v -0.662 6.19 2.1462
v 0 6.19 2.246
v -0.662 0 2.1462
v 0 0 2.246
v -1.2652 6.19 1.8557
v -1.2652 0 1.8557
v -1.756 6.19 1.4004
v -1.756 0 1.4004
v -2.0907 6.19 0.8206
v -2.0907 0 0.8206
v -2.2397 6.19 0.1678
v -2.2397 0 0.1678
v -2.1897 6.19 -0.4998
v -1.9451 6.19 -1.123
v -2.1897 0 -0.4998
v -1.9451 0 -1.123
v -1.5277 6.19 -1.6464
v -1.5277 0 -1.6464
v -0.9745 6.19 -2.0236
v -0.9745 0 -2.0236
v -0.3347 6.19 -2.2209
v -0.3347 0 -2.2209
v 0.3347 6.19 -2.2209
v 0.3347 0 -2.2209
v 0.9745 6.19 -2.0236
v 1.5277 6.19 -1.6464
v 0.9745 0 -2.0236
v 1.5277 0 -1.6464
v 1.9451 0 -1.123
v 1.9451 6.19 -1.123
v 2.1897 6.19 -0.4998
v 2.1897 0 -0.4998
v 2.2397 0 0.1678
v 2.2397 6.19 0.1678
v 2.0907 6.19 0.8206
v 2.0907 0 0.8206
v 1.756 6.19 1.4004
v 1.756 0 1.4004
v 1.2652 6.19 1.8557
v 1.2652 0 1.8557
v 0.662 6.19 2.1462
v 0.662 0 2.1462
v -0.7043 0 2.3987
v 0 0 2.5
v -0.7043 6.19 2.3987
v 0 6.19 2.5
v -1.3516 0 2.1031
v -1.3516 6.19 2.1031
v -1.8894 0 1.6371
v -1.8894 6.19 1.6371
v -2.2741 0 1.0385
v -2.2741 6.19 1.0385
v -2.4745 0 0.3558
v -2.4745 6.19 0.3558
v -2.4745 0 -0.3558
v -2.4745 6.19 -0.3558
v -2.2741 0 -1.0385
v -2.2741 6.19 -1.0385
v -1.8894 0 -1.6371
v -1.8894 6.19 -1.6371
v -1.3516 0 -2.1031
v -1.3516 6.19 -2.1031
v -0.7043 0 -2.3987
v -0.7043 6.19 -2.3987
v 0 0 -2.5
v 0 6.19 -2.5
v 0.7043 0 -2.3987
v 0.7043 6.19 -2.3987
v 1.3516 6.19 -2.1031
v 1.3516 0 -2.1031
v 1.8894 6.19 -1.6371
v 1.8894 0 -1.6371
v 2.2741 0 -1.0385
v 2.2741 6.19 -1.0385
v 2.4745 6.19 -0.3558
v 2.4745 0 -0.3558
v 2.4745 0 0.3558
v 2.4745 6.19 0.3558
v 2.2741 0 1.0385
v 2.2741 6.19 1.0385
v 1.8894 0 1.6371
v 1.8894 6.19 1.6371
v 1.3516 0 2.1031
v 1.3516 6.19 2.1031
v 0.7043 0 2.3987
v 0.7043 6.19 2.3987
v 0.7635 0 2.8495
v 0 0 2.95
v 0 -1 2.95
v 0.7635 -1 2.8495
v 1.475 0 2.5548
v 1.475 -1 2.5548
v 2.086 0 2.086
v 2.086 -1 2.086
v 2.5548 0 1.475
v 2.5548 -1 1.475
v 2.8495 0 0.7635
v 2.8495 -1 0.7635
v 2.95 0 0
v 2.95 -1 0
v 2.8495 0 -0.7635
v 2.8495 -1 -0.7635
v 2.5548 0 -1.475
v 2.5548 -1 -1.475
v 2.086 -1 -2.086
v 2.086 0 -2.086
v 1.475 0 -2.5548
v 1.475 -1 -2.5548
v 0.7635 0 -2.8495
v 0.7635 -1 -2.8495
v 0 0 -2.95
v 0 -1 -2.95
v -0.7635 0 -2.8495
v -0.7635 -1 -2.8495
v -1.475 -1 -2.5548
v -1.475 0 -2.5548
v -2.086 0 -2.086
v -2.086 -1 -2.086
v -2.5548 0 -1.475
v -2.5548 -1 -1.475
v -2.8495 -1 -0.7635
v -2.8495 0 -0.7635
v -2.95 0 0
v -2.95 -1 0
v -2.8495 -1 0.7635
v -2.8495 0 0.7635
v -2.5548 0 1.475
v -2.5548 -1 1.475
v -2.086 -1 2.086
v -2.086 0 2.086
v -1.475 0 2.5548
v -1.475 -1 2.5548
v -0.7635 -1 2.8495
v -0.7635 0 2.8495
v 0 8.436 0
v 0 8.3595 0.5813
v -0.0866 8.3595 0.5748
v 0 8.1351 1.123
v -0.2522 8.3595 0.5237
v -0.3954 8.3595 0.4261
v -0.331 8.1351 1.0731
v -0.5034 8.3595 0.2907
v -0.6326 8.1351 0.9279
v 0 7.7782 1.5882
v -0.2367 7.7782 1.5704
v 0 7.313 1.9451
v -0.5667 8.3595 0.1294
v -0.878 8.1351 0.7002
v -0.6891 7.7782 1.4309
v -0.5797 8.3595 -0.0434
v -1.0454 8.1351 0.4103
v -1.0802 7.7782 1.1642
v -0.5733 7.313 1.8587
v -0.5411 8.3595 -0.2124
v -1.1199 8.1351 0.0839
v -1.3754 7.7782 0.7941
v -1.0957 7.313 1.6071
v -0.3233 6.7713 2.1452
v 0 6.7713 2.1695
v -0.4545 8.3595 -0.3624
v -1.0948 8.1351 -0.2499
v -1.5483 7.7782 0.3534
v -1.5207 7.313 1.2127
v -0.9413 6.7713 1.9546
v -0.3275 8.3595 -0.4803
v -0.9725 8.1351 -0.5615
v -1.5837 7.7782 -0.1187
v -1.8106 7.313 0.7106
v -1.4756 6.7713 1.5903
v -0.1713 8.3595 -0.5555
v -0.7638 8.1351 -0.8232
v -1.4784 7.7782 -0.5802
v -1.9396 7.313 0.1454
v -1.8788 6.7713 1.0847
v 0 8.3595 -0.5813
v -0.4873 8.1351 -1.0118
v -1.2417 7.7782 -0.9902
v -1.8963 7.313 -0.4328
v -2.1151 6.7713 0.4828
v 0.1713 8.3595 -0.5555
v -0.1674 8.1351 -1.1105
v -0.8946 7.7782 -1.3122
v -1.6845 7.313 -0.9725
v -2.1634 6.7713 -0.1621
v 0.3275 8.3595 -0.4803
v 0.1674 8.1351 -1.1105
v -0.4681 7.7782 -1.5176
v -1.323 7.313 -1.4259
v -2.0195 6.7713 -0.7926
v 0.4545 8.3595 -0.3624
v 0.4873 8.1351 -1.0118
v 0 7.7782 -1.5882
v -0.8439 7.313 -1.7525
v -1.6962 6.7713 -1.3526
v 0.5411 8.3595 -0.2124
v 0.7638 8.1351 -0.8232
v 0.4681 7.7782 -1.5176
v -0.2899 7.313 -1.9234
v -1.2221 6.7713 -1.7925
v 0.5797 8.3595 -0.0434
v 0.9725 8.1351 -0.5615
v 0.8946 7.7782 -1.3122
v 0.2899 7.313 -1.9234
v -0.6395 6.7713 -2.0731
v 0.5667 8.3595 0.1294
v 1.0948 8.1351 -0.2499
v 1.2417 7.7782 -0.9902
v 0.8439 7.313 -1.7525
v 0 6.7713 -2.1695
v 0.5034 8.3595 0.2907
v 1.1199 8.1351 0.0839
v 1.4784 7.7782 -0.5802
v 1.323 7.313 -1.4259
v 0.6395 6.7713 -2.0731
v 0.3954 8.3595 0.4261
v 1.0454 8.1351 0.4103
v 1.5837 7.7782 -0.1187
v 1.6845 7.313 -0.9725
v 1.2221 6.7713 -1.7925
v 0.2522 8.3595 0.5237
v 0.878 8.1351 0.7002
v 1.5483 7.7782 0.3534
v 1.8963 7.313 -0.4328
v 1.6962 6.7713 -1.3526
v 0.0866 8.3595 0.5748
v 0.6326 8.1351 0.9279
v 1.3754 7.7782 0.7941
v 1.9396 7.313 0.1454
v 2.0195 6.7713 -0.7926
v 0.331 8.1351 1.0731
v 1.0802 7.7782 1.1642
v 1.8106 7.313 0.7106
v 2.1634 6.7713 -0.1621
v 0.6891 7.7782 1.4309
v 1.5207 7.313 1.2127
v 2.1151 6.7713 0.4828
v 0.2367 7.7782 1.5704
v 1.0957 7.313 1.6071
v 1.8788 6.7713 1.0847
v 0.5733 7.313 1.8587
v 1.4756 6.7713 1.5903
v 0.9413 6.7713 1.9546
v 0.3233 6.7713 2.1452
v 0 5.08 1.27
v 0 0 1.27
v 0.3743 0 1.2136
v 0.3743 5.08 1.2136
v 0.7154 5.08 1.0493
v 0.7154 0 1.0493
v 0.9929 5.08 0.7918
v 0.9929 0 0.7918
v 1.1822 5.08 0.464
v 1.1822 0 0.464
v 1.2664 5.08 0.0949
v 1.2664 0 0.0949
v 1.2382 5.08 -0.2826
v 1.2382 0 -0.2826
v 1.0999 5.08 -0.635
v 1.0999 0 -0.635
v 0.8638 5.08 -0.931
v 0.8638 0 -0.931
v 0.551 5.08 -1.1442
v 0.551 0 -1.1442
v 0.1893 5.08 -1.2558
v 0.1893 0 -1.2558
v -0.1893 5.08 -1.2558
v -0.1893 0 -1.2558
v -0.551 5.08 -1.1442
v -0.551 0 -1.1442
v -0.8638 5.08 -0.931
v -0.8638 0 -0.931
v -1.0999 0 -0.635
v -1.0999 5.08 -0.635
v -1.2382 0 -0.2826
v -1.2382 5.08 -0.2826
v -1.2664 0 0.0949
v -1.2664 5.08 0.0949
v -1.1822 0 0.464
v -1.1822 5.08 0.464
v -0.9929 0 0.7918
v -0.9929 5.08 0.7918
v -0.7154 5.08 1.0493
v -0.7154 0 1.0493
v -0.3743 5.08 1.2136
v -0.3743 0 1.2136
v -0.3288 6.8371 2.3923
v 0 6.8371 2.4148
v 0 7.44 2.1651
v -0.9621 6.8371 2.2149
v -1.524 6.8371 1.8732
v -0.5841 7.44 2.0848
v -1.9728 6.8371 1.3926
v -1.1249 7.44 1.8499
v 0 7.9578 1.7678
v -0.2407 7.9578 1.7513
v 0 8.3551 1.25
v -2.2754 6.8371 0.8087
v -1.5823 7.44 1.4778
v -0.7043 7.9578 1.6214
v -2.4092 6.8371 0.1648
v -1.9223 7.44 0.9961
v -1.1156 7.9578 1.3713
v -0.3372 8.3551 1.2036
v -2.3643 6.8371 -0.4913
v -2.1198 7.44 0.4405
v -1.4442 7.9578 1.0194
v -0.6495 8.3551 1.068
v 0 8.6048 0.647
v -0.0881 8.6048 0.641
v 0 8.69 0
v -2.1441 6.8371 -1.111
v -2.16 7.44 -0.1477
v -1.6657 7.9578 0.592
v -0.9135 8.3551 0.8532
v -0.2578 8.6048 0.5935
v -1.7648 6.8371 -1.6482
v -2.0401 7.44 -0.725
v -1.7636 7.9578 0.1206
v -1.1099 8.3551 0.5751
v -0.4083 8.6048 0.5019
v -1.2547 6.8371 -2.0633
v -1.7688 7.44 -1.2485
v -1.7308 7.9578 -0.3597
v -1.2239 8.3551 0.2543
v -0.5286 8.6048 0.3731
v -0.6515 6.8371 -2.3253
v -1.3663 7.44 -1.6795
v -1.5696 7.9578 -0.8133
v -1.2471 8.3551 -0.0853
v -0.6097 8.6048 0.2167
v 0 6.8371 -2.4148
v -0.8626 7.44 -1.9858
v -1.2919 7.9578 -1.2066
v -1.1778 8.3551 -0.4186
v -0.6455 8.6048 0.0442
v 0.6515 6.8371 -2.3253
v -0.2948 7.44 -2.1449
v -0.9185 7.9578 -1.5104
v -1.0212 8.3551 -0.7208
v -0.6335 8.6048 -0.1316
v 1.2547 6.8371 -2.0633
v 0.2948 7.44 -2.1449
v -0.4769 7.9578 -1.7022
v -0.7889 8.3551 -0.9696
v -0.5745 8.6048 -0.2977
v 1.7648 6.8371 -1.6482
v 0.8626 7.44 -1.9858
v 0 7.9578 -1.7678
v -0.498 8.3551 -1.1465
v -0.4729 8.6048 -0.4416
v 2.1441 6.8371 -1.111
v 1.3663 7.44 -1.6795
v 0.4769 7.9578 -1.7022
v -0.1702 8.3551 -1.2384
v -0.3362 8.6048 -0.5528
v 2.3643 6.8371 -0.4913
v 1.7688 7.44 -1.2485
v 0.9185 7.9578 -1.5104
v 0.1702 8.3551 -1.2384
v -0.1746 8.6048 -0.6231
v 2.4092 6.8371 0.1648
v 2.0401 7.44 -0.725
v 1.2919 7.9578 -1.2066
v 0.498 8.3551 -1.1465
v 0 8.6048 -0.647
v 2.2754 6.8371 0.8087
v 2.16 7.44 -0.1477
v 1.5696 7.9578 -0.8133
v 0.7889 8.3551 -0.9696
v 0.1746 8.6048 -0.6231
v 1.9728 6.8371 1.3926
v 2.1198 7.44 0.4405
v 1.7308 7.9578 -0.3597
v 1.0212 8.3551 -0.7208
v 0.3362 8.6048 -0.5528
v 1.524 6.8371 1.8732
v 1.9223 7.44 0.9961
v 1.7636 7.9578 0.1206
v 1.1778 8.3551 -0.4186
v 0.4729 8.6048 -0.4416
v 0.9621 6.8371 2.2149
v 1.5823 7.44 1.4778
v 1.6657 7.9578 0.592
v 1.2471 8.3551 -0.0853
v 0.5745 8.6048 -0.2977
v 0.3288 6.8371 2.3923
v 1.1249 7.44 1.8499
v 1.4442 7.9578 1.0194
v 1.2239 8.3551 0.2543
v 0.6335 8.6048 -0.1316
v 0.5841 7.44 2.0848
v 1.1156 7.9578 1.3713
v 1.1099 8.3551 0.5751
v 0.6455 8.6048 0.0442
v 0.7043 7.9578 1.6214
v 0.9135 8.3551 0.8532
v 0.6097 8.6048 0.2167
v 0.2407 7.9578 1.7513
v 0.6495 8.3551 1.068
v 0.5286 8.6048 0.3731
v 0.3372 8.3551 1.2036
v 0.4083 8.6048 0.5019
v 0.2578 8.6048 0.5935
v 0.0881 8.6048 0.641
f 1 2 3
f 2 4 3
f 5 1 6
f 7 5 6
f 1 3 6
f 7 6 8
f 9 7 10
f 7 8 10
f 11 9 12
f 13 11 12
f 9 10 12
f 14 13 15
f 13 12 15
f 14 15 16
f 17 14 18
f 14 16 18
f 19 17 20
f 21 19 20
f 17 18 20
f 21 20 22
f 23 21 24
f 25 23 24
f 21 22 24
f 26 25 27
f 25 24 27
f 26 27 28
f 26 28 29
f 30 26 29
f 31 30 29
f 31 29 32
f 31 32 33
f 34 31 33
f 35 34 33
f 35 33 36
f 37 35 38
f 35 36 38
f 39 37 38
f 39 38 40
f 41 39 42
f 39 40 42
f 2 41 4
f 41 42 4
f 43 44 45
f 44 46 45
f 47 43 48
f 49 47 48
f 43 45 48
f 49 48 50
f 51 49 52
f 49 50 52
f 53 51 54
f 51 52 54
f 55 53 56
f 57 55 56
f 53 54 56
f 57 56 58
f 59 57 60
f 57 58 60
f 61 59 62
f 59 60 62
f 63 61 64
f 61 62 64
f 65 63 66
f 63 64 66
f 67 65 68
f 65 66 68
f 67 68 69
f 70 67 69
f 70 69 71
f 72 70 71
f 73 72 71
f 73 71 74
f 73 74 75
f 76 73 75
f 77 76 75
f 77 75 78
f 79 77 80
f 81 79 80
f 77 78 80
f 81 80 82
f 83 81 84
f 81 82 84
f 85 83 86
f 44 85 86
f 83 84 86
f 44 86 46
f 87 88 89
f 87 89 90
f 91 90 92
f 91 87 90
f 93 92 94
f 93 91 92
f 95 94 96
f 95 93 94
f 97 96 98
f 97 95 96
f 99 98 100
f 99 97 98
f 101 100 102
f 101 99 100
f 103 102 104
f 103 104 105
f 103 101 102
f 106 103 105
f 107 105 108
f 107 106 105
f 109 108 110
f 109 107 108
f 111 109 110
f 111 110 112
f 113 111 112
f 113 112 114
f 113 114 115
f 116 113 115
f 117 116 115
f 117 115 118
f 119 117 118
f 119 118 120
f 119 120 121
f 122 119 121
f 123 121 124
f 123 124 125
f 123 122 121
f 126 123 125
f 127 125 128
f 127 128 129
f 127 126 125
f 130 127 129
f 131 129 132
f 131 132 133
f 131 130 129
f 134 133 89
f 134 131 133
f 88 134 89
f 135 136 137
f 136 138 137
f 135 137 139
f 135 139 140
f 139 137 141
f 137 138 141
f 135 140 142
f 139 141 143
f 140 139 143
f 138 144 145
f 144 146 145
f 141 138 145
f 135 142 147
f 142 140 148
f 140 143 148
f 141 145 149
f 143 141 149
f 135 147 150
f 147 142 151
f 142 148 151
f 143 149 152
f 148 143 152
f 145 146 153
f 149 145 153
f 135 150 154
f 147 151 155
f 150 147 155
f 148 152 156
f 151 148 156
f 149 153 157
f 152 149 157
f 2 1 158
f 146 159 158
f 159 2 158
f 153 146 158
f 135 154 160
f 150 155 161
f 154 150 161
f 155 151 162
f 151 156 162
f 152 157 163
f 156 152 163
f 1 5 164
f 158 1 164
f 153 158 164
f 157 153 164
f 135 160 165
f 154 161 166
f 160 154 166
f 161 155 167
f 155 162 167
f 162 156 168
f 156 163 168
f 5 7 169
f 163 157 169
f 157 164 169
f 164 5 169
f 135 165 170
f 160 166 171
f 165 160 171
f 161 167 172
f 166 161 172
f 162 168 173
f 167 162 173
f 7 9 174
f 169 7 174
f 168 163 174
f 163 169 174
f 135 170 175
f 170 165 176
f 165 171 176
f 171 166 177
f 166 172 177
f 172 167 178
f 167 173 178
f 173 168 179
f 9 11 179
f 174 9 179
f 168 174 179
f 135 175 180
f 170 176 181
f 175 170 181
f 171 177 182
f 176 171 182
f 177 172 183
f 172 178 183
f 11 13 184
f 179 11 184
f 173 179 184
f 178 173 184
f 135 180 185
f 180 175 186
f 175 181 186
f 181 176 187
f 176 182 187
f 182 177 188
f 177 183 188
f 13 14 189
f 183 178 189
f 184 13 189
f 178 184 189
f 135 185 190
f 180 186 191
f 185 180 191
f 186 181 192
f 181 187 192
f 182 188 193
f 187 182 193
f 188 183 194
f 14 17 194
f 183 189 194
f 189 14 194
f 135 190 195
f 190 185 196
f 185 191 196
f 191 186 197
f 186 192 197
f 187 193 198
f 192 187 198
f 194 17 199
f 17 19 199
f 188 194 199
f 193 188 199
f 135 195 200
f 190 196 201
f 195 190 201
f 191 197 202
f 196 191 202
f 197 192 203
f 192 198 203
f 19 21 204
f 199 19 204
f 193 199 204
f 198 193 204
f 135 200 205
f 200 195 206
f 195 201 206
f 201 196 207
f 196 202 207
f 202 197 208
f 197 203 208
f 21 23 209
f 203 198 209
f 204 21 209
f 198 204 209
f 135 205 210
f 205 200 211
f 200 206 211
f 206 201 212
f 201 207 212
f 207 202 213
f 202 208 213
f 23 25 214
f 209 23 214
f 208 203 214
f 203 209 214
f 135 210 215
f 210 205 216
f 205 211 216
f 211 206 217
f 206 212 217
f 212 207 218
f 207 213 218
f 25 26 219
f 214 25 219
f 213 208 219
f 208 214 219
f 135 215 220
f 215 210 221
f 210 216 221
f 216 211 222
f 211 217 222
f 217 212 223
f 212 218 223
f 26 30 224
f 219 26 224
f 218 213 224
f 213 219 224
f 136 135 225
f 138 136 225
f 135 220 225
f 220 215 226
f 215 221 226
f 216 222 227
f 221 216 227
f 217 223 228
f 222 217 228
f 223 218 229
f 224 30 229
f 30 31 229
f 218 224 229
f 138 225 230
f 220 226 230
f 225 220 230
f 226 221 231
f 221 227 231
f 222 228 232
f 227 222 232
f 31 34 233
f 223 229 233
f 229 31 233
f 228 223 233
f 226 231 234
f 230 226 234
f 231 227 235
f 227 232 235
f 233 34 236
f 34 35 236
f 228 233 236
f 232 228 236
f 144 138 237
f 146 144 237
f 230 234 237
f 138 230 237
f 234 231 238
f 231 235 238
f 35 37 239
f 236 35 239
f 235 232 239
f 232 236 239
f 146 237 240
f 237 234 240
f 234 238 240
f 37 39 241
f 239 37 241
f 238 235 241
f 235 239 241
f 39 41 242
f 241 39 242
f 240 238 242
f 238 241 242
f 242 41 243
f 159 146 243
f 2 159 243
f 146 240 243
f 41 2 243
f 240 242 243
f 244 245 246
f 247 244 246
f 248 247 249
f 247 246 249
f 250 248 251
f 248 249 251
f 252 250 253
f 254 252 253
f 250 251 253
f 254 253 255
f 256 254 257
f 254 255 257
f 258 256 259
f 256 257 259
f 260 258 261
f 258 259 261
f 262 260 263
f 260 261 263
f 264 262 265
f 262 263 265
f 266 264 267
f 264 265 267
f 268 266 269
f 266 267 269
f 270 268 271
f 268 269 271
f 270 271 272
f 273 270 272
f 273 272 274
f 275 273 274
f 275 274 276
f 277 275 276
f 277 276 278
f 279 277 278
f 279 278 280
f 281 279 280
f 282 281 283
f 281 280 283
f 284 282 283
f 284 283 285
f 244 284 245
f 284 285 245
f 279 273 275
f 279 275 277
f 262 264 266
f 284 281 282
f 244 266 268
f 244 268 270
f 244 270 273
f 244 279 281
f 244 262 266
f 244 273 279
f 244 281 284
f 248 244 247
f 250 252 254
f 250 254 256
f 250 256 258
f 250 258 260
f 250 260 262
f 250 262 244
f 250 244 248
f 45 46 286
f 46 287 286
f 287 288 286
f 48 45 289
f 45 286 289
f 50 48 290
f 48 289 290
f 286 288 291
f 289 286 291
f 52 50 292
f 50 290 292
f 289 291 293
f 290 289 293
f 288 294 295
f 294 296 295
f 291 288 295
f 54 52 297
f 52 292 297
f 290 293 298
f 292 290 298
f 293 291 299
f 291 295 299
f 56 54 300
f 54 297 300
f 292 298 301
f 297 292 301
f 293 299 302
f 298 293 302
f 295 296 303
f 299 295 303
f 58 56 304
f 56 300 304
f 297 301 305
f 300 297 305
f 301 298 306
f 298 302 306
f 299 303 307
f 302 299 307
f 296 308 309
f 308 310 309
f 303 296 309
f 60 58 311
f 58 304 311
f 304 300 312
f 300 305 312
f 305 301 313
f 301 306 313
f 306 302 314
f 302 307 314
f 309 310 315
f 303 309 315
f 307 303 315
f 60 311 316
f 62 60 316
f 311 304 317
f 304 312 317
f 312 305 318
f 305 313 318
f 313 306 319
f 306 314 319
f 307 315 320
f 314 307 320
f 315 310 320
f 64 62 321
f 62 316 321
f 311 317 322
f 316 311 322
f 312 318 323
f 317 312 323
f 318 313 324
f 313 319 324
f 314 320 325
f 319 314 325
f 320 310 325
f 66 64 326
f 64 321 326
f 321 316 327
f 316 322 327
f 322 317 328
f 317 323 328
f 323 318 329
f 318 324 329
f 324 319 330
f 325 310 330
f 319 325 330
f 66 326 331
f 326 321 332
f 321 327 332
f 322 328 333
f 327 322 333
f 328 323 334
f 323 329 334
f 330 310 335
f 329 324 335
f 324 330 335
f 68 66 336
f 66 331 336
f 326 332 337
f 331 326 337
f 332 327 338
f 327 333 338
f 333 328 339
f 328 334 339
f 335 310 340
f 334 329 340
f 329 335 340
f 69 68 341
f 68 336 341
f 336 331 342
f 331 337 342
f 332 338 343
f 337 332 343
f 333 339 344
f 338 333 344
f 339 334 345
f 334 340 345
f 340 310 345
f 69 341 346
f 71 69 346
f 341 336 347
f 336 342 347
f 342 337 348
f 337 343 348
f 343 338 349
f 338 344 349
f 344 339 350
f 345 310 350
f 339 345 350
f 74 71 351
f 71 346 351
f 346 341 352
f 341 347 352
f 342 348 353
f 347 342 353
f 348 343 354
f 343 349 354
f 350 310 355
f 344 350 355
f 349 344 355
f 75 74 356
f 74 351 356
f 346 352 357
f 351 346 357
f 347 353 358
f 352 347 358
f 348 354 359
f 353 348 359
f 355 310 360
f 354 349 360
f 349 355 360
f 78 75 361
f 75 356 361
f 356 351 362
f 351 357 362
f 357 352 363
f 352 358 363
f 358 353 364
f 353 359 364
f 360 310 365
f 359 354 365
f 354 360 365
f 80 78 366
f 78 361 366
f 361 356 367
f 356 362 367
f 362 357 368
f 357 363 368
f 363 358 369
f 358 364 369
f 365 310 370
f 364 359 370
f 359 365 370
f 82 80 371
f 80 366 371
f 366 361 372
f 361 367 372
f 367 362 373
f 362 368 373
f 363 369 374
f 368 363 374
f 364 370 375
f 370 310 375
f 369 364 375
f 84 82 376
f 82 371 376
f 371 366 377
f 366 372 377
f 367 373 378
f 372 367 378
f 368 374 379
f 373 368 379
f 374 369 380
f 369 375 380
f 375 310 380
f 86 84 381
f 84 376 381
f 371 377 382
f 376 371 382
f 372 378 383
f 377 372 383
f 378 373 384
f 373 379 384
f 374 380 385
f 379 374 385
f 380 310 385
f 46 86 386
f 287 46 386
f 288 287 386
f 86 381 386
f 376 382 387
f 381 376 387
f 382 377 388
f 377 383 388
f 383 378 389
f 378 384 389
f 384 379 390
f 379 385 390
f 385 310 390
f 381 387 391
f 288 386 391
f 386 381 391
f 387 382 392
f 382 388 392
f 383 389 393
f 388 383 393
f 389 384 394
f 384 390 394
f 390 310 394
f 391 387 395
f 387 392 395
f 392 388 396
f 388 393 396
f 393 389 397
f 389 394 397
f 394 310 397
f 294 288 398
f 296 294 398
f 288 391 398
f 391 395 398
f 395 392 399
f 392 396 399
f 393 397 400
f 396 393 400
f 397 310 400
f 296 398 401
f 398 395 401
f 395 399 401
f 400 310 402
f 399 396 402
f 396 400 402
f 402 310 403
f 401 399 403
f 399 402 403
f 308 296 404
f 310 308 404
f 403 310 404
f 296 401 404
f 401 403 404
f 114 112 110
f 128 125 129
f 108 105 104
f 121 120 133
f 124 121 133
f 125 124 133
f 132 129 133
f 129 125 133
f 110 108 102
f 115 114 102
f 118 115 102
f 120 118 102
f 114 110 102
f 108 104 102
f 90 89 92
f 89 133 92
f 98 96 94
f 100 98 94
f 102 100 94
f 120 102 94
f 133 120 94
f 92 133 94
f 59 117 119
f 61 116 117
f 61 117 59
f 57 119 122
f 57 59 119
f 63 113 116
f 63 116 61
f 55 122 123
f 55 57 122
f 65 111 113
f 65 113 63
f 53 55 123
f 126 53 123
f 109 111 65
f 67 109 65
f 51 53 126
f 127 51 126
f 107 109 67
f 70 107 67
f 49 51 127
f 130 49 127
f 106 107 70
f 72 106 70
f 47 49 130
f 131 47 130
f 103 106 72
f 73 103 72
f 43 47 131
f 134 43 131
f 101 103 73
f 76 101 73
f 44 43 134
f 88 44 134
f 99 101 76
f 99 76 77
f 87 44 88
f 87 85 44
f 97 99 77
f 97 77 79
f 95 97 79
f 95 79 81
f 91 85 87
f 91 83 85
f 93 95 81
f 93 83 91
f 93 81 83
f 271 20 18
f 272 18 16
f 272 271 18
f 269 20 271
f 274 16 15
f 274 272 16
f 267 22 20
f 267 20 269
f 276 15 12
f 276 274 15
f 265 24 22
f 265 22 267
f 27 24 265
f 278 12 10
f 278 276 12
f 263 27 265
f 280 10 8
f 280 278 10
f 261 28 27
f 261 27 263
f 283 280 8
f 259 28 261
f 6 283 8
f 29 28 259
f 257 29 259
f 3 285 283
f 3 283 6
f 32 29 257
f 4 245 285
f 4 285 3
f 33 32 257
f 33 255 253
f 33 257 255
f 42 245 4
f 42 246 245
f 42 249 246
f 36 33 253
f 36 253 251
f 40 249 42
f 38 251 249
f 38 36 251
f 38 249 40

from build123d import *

# Parameters (mm, degrees)
SKETCH2_R   = 2.9499941
BASE_DEPTH  = 1.00000054
SKETCH4_R   = 1.27
DIODE_DEPTH = 5.08


with BuildPart() as part:
    # Sketch1 → Shell (revolve)
    with BuildSketch(Plane.XY, mode=Mode.PRIVATE) as shell_sk:
        with BuildLine():
            Line((-2.499995, 0), (-2.499995, 6.1900054))
            ThreePointArc((-2.499995, 6.1900054), (-1.767763417, 7.957768817), (0, 8.6900004))
            Line((0, 8.6900004), (0, 8.4360004))
            ThreePointArc((0, 8.4360004), (-1.588158295, 7.778163695), (-2.245995, 6.1900054))
            Line((-2.245995, 6.1900054), (-2.245995, 0))
            Line((-2.245995, 0), (-2.499995, 0))
        make_face()
    revolve(shell_sk.sketch.rotate(Axis((0, 9.12450042, 0), (0, -1, 0)), 270), axis=Axis((0, 9.12450042, 0), (0, -1, 0)))

    # Sketch2 → Base (add)
    with BuildSketch(Plane(origin=(0, 0, 0), x_dir=(1, 0, 0), z_dir=(0, 1, 0))):
        with Locations(Location((0, 0, 0), (0, 0, 270))):
            Circle(SKETCH2_R)
    extrude(amount=-BASE_DEPTH)

    # Sketch4 → Diode (add)
    with BuildSketch(Plane(origin=(0, 0, 0), x_dir=(1, 0, 0), z_dir=(0, 1, 0))):
        with Locations(Location((0, 0, 0), (0, 0, 270))):
            Circle(SKETCH4_R)
    extrude(amount=DIODE_DEPTH)


solid = part.part
